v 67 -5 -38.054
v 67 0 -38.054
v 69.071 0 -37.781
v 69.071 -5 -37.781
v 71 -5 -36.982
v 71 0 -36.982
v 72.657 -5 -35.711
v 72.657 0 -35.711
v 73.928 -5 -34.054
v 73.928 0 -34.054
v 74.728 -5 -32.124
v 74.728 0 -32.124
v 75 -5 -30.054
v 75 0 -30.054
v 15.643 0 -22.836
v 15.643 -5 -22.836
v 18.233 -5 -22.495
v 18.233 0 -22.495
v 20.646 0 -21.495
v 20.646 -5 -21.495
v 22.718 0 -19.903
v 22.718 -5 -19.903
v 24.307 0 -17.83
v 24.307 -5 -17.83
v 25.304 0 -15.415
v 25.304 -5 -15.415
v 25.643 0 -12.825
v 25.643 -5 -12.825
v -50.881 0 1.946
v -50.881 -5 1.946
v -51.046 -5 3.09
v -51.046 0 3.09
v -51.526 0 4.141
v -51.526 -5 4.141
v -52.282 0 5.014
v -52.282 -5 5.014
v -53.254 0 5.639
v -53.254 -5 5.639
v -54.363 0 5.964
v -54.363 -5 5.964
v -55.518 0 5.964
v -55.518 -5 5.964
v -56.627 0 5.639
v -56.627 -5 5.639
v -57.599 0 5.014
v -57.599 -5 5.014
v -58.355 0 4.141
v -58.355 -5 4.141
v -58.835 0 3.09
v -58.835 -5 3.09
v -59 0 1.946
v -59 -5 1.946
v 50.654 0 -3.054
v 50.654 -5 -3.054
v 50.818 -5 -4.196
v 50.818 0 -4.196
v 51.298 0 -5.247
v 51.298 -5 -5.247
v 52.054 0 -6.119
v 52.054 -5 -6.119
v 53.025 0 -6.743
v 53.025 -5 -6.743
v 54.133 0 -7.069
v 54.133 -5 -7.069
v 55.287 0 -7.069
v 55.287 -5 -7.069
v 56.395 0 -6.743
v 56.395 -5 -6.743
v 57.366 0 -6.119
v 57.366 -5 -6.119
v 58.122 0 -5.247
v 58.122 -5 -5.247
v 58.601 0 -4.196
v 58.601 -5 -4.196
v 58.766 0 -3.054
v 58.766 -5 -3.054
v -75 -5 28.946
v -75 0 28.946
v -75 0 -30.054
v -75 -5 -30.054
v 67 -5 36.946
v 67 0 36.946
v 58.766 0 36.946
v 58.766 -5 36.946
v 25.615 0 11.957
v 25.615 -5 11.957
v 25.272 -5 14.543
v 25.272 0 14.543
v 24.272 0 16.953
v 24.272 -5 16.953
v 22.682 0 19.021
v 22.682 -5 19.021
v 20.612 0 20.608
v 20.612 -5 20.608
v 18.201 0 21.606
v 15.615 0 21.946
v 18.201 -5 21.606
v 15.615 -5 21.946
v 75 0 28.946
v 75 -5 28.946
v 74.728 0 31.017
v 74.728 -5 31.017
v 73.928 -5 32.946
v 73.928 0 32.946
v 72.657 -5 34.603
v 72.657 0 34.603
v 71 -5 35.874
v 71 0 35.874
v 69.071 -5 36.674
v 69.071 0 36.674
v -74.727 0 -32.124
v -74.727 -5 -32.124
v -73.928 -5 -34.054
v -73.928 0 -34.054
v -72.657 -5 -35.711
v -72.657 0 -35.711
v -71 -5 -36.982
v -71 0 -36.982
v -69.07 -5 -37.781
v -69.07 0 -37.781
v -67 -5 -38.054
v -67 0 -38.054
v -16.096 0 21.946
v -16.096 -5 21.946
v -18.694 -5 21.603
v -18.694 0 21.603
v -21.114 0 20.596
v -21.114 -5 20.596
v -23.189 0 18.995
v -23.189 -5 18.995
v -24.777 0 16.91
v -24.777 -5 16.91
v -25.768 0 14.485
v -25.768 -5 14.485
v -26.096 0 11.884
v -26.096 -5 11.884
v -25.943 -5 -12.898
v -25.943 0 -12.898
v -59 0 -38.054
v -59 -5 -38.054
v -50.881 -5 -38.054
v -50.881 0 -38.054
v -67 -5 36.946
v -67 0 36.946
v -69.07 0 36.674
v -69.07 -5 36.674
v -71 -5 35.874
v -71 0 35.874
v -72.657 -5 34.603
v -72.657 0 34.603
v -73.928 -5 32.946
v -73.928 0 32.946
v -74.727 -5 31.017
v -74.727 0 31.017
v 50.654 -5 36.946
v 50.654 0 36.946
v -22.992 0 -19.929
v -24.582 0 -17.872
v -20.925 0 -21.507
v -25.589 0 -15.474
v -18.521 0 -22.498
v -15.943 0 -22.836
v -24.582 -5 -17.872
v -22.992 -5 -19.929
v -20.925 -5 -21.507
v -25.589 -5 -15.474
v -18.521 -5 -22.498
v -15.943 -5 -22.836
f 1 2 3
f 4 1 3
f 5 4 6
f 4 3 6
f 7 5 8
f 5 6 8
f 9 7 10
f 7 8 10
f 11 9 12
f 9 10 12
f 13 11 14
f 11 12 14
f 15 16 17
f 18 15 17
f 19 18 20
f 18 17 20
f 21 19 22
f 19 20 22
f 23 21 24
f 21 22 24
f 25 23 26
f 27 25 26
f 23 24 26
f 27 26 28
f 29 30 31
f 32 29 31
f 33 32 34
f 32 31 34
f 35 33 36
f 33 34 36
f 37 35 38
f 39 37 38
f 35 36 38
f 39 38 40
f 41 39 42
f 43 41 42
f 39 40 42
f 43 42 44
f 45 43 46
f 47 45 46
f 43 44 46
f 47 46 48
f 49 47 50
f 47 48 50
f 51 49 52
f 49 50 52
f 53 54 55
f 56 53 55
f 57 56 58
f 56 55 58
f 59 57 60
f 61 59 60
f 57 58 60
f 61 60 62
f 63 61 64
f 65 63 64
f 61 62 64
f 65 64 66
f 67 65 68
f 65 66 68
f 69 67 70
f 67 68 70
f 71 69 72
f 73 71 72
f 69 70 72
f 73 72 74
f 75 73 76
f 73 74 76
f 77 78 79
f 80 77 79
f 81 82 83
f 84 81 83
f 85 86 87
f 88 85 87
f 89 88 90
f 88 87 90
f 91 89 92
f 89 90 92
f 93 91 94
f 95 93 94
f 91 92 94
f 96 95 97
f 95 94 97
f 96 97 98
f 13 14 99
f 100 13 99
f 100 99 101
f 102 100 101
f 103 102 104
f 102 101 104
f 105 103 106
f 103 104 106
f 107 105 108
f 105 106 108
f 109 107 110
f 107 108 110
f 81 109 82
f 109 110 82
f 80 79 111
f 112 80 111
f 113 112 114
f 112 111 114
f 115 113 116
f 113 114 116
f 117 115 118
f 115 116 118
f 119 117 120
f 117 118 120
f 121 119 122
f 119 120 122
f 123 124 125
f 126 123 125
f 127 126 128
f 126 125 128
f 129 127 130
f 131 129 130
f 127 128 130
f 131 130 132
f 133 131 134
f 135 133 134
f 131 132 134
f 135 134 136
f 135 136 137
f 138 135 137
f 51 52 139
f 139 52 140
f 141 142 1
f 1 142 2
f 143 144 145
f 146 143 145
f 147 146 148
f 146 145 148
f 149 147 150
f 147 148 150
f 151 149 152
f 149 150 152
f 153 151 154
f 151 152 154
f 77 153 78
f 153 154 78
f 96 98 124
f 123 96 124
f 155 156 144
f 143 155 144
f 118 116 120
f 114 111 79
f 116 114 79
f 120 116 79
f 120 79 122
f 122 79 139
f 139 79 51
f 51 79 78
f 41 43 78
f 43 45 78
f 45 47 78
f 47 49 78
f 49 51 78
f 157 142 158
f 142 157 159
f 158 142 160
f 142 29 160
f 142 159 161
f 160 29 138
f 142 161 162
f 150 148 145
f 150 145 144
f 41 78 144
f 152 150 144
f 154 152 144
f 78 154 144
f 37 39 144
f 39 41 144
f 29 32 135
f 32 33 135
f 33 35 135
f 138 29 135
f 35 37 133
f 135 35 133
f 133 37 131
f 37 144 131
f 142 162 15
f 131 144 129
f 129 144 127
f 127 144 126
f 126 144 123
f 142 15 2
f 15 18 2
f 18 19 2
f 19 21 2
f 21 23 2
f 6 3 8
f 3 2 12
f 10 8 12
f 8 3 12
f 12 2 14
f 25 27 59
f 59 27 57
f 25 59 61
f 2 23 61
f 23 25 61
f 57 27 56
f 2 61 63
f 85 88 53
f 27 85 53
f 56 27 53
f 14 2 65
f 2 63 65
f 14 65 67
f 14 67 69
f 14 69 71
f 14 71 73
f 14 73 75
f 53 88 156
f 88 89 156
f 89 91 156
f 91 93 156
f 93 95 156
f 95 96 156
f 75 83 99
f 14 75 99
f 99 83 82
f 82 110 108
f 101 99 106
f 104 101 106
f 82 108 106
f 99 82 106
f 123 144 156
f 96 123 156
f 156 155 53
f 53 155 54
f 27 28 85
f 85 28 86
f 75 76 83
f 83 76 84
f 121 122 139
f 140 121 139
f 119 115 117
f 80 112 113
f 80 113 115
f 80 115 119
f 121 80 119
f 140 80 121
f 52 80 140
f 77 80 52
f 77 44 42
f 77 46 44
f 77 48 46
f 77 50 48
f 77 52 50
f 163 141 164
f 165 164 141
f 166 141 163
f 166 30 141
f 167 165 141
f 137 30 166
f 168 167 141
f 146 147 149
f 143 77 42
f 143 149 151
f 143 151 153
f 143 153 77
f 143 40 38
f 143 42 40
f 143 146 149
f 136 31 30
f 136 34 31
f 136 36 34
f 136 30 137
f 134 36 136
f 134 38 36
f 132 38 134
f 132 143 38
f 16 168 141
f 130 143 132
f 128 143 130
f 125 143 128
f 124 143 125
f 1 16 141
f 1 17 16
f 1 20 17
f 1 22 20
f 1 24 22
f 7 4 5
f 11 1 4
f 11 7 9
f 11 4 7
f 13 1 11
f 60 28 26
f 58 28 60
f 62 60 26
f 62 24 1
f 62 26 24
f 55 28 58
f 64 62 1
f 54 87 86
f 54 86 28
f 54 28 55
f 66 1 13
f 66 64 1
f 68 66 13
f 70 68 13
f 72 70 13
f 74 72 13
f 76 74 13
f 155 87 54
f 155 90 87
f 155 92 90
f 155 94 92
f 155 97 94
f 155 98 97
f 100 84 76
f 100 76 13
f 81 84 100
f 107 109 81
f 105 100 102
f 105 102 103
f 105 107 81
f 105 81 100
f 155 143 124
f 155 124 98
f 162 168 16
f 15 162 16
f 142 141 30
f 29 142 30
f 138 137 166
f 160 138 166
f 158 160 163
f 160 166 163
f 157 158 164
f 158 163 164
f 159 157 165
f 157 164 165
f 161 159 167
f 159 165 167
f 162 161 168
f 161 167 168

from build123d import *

# Parameters (mm, degrees)
F1_DEPTH = 5
F3_DEPTH = 25
F5_DEPTH = 73
F7_DEPTH = 25


with BuildPart() as f1:
    # F0 (on Front) → F1 (new body)
    with BuildSketch(Plane.XZ):
        with BuildLine():
            ThreePointArc((-66.9997713815, 36.9462131122), (-72.656625631, 34.6030673617), (-74.9997713815, 28.9462131122))
            Line((-74.9997713815, 28.9462131122), (-74.9997713815, -30.0537868878))
            ThreePointArc((-74.9997713815, -30.0537868878), (-72.656625631, -35.7106411373), (-66.9997713815, -38.0537868878))
            Line((-66.9997713815, -38.0537868878), (67.0002286185, -38.0537868878))
            ThreePointArc((67.0002286185, -38.0537868878), (72.657082868, -35.7106411373), (75.0002286185, -30.0537868878))
            Line((75.0002286185, -30.0537868878), (75.0002286185, 28.9462131122))
            ThreePointArc((75.0002286185, 28.9462131122), (72.657082868, 34.6030673617), (67.0002286185, 36.9462131122))
            Line((67.0002286185, 36.9462131122), (-66.9997713815, 36.9462131122))
        make_face()
    extrude(amount=F1_DEPTH)

    # F2 (on face) → F3 (cut)
    with BuildSketch(Plane.XZ.offset(5)):
        with BuildLine():
            Line((-58.9997713815, 1.9462131122), (-58.9997713815, -38.0537868878))
            Line((-58.9997713815, -38.0537868878), (-50.8812127065, -38.0537868878))
            Line((-50.8812127065, -38.0537868878), (-50.8812127065, 1.9462131122))
            ThreePointArc((-50.8812127065, 1.9462131122), (-54.940492044, 6.0054924497), (-58.9997713815, 1.9462131122))
        make_face()
    extrude(amount=-F3_DEPTH, mode=Mode.SUBTRACT)

    # F4 (on face) → F5 (cut)
    with BuildSketch(Plane.XZ.offset(5)):
        with BuildLine():
            Line((58.7657689438, -3.0537868878), (58.7657689438, 36.9462131122))
            Line((58.7657689438, 36.9462131122), (50.6537689438, 36.9462131122))
            Line((50.6537689438, 36.9462131122), (50.6537689438, -3.0537868878))
            ThreePointArc((50.6537689438, -3.0537868878), (54.7097689438, -7.1097868878), (58.7657689438, -3.0537868878))
        make_face()
    extrude(amount=-F5_DEPTH, mode=Mode.SUBTRACT)

    # F6 (on face) → F7 (cut)
    with BuildSketch(Plane.XZ.offset(5)):
        with BuildLine():
            ThreePointArc((25.6149837678, 11.9573603601), (22.6821155465, 19.0212209736), (15.6149899808, 21.9462131122))
            Line((15.6149899808, 21.9462131122), (-16.0960132249, 21.9462131122))
            ThreePointArc((-16.0960132249, 21.9462131122), (-23.1889002898, 18.9953941344), (-26.0958222031, 11.8844037291))
            Line((-26.0958222031, 11.8844037291), (-25.942641223, -12.897926457))
            ThreePointArc((-25.942641223, -12.897926457), (-22.992013267, -19.9290041388), (-15.9428322448, -22.8361170739))
            Line((-15.9428322448, -22.8361170739), (15.6426154759, -22.8361170739))
            ThreePointArc((15.6426154759, -22.8361170739), (22.7176233373, -19.9032426395), (25.6426092628, -12.824969826))
            Line((25.6426092628, -12.824969826), (25.6149837678, 11.9573603601))
        make_face()
    extrude(amount=-F7_DEPTH, mode=Mode.SUBTRACT)


solid = f1.part
